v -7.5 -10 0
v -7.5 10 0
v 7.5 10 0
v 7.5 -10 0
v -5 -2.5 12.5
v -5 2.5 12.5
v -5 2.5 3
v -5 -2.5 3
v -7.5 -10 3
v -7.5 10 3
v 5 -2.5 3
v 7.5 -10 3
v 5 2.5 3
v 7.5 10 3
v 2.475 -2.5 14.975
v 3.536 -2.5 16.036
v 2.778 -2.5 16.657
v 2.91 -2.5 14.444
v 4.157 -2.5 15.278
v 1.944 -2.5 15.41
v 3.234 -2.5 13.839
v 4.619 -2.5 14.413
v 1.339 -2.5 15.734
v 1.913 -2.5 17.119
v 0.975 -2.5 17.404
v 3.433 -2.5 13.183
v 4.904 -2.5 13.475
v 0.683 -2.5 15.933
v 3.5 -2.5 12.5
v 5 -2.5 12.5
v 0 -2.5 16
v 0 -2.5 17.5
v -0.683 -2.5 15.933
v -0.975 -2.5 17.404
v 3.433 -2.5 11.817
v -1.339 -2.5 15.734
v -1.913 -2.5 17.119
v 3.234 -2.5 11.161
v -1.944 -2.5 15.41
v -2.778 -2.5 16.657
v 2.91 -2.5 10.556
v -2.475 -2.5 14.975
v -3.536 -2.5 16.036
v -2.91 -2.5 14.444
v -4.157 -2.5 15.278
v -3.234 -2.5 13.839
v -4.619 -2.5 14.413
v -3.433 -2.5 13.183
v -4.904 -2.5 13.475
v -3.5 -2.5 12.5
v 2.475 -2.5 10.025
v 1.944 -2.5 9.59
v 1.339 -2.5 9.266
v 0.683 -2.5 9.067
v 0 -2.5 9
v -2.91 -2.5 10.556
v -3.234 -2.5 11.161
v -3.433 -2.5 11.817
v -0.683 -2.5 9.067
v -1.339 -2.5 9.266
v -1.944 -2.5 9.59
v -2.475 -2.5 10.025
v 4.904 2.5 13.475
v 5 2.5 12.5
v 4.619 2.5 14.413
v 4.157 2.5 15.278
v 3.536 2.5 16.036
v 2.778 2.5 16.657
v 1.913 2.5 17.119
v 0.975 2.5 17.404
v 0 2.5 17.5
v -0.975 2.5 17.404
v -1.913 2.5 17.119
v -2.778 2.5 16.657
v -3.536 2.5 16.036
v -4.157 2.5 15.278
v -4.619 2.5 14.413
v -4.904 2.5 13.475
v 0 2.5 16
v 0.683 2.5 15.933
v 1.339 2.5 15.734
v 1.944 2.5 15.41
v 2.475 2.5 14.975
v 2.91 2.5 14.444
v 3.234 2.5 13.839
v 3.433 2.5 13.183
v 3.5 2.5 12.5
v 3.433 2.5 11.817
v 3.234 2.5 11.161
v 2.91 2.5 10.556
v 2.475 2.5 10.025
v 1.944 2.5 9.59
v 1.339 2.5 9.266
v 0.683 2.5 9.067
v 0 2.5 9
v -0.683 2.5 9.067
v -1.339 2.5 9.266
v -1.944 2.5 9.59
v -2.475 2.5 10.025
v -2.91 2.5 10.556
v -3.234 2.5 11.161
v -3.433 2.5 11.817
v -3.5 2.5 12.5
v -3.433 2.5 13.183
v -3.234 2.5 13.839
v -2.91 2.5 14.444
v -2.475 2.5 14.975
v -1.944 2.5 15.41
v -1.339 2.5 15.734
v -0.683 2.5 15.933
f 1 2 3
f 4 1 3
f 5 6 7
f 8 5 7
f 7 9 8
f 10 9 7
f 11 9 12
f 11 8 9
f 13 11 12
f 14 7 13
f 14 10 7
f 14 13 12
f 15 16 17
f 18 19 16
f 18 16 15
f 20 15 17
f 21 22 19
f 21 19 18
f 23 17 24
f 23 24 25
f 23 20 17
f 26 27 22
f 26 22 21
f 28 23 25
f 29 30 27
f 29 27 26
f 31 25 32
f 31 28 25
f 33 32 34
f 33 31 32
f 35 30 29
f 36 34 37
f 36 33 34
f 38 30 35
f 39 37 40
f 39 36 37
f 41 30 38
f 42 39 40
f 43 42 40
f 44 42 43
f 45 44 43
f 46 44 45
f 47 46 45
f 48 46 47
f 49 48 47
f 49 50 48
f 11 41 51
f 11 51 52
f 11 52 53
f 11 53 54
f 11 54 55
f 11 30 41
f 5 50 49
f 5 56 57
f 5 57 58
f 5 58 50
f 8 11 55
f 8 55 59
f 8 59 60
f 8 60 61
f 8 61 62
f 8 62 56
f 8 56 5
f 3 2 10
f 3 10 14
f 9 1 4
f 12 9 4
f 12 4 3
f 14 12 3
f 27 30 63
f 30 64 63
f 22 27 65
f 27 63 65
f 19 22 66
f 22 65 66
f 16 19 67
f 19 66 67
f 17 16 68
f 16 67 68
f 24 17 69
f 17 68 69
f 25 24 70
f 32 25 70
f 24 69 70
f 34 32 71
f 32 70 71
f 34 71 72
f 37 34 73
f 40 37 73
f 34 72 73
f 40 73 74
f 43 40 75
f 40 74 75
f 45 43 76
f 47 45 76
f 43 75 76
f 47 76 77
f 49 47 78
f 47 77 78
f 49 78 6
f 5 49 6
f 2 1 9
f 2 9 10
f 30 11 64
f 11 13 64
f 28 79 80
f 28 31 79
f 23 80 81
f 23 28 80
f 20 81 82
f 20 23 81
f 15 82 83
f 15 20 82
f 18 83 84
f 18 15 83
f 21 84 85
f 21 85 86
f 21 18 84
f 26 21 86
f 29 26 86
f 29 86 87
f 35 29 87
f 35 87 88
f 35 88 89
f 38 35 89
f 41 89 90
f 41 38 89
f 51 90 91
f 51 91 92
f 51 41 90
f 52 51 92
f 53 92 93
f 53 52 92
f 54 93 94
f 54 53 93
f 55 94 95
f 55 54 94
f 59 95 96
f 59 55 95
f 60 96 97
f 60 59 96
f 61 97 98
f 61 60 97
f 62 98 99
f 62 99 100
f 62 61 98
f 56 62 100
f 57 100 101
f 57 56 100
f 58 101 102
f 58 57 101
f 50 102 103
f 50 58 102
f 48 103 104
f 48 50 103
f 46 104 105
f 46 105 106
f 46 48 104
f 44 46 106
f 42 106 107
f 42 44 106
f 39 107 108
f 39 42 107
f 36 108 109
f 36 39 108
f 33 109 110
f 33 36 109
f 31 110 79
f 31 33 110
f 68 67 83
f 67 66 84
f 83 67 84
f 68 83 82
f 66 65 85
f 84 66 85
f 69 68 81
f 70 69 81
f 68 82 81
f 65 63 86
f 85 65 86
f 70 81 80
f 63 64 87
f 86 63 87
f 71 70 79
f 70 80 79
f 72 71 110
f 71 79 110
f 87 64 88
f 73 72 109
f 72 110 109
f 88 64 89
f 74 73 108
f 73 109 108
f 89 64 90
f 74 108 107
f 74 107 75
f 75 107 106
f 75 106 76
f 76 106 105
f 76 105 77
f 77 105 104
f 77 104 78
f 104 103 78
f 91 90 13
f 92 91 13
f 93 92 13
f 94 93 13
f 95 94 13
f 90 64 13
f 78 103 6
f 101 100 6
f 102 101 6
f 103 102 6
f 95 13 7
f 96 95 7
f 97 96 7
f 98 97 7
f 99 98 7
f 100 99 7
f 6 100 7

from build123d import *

# Parameters (mm, degrees)
SKETCH1_W           = 15
SKETCH1_H           = 20
BOSS_EXTRUDE2_DEPTH = 3
SKETCH2_R           = 3.5
BOSS_EXTRUDE3_DEPTH = 2.5


with BuildPart() as part:
    # Sketch1 → Boss-Extrude2 (new body)
    with BuildSketch(Plane.XY):
        Rectangle(SKETCH1_W, SKETCH1_H)
    extrude(amount=BOSS_EXTRUDE2_DEPTH)

    # Sketch2 → Boss-Extrude3 (add, symmetric)
    with BuildSketch(Plane(origin=(0, 0, 0), x_dir=(1, 0, 0), z_dir=(0, 1, 0))):
        with BuildLine():
            Line((-5, -3), (5, -3))
            Line((5, -3), (5, -12.5))
            ThreePointArc((5, -12.5), (0, -17.5), (-5, -12.5))
            Line((-5, -12.5), (-5, -3))
        make_face()
        with Locations(Location((0, -12.5, 0), (0, 0, 270))):
            Circle(SKETCH2_R, mode=Mode.SUBTRACT)
    extrude(amount=BOSS_EXTRUDE3_DEPTH, both=True)


solid = part.part
